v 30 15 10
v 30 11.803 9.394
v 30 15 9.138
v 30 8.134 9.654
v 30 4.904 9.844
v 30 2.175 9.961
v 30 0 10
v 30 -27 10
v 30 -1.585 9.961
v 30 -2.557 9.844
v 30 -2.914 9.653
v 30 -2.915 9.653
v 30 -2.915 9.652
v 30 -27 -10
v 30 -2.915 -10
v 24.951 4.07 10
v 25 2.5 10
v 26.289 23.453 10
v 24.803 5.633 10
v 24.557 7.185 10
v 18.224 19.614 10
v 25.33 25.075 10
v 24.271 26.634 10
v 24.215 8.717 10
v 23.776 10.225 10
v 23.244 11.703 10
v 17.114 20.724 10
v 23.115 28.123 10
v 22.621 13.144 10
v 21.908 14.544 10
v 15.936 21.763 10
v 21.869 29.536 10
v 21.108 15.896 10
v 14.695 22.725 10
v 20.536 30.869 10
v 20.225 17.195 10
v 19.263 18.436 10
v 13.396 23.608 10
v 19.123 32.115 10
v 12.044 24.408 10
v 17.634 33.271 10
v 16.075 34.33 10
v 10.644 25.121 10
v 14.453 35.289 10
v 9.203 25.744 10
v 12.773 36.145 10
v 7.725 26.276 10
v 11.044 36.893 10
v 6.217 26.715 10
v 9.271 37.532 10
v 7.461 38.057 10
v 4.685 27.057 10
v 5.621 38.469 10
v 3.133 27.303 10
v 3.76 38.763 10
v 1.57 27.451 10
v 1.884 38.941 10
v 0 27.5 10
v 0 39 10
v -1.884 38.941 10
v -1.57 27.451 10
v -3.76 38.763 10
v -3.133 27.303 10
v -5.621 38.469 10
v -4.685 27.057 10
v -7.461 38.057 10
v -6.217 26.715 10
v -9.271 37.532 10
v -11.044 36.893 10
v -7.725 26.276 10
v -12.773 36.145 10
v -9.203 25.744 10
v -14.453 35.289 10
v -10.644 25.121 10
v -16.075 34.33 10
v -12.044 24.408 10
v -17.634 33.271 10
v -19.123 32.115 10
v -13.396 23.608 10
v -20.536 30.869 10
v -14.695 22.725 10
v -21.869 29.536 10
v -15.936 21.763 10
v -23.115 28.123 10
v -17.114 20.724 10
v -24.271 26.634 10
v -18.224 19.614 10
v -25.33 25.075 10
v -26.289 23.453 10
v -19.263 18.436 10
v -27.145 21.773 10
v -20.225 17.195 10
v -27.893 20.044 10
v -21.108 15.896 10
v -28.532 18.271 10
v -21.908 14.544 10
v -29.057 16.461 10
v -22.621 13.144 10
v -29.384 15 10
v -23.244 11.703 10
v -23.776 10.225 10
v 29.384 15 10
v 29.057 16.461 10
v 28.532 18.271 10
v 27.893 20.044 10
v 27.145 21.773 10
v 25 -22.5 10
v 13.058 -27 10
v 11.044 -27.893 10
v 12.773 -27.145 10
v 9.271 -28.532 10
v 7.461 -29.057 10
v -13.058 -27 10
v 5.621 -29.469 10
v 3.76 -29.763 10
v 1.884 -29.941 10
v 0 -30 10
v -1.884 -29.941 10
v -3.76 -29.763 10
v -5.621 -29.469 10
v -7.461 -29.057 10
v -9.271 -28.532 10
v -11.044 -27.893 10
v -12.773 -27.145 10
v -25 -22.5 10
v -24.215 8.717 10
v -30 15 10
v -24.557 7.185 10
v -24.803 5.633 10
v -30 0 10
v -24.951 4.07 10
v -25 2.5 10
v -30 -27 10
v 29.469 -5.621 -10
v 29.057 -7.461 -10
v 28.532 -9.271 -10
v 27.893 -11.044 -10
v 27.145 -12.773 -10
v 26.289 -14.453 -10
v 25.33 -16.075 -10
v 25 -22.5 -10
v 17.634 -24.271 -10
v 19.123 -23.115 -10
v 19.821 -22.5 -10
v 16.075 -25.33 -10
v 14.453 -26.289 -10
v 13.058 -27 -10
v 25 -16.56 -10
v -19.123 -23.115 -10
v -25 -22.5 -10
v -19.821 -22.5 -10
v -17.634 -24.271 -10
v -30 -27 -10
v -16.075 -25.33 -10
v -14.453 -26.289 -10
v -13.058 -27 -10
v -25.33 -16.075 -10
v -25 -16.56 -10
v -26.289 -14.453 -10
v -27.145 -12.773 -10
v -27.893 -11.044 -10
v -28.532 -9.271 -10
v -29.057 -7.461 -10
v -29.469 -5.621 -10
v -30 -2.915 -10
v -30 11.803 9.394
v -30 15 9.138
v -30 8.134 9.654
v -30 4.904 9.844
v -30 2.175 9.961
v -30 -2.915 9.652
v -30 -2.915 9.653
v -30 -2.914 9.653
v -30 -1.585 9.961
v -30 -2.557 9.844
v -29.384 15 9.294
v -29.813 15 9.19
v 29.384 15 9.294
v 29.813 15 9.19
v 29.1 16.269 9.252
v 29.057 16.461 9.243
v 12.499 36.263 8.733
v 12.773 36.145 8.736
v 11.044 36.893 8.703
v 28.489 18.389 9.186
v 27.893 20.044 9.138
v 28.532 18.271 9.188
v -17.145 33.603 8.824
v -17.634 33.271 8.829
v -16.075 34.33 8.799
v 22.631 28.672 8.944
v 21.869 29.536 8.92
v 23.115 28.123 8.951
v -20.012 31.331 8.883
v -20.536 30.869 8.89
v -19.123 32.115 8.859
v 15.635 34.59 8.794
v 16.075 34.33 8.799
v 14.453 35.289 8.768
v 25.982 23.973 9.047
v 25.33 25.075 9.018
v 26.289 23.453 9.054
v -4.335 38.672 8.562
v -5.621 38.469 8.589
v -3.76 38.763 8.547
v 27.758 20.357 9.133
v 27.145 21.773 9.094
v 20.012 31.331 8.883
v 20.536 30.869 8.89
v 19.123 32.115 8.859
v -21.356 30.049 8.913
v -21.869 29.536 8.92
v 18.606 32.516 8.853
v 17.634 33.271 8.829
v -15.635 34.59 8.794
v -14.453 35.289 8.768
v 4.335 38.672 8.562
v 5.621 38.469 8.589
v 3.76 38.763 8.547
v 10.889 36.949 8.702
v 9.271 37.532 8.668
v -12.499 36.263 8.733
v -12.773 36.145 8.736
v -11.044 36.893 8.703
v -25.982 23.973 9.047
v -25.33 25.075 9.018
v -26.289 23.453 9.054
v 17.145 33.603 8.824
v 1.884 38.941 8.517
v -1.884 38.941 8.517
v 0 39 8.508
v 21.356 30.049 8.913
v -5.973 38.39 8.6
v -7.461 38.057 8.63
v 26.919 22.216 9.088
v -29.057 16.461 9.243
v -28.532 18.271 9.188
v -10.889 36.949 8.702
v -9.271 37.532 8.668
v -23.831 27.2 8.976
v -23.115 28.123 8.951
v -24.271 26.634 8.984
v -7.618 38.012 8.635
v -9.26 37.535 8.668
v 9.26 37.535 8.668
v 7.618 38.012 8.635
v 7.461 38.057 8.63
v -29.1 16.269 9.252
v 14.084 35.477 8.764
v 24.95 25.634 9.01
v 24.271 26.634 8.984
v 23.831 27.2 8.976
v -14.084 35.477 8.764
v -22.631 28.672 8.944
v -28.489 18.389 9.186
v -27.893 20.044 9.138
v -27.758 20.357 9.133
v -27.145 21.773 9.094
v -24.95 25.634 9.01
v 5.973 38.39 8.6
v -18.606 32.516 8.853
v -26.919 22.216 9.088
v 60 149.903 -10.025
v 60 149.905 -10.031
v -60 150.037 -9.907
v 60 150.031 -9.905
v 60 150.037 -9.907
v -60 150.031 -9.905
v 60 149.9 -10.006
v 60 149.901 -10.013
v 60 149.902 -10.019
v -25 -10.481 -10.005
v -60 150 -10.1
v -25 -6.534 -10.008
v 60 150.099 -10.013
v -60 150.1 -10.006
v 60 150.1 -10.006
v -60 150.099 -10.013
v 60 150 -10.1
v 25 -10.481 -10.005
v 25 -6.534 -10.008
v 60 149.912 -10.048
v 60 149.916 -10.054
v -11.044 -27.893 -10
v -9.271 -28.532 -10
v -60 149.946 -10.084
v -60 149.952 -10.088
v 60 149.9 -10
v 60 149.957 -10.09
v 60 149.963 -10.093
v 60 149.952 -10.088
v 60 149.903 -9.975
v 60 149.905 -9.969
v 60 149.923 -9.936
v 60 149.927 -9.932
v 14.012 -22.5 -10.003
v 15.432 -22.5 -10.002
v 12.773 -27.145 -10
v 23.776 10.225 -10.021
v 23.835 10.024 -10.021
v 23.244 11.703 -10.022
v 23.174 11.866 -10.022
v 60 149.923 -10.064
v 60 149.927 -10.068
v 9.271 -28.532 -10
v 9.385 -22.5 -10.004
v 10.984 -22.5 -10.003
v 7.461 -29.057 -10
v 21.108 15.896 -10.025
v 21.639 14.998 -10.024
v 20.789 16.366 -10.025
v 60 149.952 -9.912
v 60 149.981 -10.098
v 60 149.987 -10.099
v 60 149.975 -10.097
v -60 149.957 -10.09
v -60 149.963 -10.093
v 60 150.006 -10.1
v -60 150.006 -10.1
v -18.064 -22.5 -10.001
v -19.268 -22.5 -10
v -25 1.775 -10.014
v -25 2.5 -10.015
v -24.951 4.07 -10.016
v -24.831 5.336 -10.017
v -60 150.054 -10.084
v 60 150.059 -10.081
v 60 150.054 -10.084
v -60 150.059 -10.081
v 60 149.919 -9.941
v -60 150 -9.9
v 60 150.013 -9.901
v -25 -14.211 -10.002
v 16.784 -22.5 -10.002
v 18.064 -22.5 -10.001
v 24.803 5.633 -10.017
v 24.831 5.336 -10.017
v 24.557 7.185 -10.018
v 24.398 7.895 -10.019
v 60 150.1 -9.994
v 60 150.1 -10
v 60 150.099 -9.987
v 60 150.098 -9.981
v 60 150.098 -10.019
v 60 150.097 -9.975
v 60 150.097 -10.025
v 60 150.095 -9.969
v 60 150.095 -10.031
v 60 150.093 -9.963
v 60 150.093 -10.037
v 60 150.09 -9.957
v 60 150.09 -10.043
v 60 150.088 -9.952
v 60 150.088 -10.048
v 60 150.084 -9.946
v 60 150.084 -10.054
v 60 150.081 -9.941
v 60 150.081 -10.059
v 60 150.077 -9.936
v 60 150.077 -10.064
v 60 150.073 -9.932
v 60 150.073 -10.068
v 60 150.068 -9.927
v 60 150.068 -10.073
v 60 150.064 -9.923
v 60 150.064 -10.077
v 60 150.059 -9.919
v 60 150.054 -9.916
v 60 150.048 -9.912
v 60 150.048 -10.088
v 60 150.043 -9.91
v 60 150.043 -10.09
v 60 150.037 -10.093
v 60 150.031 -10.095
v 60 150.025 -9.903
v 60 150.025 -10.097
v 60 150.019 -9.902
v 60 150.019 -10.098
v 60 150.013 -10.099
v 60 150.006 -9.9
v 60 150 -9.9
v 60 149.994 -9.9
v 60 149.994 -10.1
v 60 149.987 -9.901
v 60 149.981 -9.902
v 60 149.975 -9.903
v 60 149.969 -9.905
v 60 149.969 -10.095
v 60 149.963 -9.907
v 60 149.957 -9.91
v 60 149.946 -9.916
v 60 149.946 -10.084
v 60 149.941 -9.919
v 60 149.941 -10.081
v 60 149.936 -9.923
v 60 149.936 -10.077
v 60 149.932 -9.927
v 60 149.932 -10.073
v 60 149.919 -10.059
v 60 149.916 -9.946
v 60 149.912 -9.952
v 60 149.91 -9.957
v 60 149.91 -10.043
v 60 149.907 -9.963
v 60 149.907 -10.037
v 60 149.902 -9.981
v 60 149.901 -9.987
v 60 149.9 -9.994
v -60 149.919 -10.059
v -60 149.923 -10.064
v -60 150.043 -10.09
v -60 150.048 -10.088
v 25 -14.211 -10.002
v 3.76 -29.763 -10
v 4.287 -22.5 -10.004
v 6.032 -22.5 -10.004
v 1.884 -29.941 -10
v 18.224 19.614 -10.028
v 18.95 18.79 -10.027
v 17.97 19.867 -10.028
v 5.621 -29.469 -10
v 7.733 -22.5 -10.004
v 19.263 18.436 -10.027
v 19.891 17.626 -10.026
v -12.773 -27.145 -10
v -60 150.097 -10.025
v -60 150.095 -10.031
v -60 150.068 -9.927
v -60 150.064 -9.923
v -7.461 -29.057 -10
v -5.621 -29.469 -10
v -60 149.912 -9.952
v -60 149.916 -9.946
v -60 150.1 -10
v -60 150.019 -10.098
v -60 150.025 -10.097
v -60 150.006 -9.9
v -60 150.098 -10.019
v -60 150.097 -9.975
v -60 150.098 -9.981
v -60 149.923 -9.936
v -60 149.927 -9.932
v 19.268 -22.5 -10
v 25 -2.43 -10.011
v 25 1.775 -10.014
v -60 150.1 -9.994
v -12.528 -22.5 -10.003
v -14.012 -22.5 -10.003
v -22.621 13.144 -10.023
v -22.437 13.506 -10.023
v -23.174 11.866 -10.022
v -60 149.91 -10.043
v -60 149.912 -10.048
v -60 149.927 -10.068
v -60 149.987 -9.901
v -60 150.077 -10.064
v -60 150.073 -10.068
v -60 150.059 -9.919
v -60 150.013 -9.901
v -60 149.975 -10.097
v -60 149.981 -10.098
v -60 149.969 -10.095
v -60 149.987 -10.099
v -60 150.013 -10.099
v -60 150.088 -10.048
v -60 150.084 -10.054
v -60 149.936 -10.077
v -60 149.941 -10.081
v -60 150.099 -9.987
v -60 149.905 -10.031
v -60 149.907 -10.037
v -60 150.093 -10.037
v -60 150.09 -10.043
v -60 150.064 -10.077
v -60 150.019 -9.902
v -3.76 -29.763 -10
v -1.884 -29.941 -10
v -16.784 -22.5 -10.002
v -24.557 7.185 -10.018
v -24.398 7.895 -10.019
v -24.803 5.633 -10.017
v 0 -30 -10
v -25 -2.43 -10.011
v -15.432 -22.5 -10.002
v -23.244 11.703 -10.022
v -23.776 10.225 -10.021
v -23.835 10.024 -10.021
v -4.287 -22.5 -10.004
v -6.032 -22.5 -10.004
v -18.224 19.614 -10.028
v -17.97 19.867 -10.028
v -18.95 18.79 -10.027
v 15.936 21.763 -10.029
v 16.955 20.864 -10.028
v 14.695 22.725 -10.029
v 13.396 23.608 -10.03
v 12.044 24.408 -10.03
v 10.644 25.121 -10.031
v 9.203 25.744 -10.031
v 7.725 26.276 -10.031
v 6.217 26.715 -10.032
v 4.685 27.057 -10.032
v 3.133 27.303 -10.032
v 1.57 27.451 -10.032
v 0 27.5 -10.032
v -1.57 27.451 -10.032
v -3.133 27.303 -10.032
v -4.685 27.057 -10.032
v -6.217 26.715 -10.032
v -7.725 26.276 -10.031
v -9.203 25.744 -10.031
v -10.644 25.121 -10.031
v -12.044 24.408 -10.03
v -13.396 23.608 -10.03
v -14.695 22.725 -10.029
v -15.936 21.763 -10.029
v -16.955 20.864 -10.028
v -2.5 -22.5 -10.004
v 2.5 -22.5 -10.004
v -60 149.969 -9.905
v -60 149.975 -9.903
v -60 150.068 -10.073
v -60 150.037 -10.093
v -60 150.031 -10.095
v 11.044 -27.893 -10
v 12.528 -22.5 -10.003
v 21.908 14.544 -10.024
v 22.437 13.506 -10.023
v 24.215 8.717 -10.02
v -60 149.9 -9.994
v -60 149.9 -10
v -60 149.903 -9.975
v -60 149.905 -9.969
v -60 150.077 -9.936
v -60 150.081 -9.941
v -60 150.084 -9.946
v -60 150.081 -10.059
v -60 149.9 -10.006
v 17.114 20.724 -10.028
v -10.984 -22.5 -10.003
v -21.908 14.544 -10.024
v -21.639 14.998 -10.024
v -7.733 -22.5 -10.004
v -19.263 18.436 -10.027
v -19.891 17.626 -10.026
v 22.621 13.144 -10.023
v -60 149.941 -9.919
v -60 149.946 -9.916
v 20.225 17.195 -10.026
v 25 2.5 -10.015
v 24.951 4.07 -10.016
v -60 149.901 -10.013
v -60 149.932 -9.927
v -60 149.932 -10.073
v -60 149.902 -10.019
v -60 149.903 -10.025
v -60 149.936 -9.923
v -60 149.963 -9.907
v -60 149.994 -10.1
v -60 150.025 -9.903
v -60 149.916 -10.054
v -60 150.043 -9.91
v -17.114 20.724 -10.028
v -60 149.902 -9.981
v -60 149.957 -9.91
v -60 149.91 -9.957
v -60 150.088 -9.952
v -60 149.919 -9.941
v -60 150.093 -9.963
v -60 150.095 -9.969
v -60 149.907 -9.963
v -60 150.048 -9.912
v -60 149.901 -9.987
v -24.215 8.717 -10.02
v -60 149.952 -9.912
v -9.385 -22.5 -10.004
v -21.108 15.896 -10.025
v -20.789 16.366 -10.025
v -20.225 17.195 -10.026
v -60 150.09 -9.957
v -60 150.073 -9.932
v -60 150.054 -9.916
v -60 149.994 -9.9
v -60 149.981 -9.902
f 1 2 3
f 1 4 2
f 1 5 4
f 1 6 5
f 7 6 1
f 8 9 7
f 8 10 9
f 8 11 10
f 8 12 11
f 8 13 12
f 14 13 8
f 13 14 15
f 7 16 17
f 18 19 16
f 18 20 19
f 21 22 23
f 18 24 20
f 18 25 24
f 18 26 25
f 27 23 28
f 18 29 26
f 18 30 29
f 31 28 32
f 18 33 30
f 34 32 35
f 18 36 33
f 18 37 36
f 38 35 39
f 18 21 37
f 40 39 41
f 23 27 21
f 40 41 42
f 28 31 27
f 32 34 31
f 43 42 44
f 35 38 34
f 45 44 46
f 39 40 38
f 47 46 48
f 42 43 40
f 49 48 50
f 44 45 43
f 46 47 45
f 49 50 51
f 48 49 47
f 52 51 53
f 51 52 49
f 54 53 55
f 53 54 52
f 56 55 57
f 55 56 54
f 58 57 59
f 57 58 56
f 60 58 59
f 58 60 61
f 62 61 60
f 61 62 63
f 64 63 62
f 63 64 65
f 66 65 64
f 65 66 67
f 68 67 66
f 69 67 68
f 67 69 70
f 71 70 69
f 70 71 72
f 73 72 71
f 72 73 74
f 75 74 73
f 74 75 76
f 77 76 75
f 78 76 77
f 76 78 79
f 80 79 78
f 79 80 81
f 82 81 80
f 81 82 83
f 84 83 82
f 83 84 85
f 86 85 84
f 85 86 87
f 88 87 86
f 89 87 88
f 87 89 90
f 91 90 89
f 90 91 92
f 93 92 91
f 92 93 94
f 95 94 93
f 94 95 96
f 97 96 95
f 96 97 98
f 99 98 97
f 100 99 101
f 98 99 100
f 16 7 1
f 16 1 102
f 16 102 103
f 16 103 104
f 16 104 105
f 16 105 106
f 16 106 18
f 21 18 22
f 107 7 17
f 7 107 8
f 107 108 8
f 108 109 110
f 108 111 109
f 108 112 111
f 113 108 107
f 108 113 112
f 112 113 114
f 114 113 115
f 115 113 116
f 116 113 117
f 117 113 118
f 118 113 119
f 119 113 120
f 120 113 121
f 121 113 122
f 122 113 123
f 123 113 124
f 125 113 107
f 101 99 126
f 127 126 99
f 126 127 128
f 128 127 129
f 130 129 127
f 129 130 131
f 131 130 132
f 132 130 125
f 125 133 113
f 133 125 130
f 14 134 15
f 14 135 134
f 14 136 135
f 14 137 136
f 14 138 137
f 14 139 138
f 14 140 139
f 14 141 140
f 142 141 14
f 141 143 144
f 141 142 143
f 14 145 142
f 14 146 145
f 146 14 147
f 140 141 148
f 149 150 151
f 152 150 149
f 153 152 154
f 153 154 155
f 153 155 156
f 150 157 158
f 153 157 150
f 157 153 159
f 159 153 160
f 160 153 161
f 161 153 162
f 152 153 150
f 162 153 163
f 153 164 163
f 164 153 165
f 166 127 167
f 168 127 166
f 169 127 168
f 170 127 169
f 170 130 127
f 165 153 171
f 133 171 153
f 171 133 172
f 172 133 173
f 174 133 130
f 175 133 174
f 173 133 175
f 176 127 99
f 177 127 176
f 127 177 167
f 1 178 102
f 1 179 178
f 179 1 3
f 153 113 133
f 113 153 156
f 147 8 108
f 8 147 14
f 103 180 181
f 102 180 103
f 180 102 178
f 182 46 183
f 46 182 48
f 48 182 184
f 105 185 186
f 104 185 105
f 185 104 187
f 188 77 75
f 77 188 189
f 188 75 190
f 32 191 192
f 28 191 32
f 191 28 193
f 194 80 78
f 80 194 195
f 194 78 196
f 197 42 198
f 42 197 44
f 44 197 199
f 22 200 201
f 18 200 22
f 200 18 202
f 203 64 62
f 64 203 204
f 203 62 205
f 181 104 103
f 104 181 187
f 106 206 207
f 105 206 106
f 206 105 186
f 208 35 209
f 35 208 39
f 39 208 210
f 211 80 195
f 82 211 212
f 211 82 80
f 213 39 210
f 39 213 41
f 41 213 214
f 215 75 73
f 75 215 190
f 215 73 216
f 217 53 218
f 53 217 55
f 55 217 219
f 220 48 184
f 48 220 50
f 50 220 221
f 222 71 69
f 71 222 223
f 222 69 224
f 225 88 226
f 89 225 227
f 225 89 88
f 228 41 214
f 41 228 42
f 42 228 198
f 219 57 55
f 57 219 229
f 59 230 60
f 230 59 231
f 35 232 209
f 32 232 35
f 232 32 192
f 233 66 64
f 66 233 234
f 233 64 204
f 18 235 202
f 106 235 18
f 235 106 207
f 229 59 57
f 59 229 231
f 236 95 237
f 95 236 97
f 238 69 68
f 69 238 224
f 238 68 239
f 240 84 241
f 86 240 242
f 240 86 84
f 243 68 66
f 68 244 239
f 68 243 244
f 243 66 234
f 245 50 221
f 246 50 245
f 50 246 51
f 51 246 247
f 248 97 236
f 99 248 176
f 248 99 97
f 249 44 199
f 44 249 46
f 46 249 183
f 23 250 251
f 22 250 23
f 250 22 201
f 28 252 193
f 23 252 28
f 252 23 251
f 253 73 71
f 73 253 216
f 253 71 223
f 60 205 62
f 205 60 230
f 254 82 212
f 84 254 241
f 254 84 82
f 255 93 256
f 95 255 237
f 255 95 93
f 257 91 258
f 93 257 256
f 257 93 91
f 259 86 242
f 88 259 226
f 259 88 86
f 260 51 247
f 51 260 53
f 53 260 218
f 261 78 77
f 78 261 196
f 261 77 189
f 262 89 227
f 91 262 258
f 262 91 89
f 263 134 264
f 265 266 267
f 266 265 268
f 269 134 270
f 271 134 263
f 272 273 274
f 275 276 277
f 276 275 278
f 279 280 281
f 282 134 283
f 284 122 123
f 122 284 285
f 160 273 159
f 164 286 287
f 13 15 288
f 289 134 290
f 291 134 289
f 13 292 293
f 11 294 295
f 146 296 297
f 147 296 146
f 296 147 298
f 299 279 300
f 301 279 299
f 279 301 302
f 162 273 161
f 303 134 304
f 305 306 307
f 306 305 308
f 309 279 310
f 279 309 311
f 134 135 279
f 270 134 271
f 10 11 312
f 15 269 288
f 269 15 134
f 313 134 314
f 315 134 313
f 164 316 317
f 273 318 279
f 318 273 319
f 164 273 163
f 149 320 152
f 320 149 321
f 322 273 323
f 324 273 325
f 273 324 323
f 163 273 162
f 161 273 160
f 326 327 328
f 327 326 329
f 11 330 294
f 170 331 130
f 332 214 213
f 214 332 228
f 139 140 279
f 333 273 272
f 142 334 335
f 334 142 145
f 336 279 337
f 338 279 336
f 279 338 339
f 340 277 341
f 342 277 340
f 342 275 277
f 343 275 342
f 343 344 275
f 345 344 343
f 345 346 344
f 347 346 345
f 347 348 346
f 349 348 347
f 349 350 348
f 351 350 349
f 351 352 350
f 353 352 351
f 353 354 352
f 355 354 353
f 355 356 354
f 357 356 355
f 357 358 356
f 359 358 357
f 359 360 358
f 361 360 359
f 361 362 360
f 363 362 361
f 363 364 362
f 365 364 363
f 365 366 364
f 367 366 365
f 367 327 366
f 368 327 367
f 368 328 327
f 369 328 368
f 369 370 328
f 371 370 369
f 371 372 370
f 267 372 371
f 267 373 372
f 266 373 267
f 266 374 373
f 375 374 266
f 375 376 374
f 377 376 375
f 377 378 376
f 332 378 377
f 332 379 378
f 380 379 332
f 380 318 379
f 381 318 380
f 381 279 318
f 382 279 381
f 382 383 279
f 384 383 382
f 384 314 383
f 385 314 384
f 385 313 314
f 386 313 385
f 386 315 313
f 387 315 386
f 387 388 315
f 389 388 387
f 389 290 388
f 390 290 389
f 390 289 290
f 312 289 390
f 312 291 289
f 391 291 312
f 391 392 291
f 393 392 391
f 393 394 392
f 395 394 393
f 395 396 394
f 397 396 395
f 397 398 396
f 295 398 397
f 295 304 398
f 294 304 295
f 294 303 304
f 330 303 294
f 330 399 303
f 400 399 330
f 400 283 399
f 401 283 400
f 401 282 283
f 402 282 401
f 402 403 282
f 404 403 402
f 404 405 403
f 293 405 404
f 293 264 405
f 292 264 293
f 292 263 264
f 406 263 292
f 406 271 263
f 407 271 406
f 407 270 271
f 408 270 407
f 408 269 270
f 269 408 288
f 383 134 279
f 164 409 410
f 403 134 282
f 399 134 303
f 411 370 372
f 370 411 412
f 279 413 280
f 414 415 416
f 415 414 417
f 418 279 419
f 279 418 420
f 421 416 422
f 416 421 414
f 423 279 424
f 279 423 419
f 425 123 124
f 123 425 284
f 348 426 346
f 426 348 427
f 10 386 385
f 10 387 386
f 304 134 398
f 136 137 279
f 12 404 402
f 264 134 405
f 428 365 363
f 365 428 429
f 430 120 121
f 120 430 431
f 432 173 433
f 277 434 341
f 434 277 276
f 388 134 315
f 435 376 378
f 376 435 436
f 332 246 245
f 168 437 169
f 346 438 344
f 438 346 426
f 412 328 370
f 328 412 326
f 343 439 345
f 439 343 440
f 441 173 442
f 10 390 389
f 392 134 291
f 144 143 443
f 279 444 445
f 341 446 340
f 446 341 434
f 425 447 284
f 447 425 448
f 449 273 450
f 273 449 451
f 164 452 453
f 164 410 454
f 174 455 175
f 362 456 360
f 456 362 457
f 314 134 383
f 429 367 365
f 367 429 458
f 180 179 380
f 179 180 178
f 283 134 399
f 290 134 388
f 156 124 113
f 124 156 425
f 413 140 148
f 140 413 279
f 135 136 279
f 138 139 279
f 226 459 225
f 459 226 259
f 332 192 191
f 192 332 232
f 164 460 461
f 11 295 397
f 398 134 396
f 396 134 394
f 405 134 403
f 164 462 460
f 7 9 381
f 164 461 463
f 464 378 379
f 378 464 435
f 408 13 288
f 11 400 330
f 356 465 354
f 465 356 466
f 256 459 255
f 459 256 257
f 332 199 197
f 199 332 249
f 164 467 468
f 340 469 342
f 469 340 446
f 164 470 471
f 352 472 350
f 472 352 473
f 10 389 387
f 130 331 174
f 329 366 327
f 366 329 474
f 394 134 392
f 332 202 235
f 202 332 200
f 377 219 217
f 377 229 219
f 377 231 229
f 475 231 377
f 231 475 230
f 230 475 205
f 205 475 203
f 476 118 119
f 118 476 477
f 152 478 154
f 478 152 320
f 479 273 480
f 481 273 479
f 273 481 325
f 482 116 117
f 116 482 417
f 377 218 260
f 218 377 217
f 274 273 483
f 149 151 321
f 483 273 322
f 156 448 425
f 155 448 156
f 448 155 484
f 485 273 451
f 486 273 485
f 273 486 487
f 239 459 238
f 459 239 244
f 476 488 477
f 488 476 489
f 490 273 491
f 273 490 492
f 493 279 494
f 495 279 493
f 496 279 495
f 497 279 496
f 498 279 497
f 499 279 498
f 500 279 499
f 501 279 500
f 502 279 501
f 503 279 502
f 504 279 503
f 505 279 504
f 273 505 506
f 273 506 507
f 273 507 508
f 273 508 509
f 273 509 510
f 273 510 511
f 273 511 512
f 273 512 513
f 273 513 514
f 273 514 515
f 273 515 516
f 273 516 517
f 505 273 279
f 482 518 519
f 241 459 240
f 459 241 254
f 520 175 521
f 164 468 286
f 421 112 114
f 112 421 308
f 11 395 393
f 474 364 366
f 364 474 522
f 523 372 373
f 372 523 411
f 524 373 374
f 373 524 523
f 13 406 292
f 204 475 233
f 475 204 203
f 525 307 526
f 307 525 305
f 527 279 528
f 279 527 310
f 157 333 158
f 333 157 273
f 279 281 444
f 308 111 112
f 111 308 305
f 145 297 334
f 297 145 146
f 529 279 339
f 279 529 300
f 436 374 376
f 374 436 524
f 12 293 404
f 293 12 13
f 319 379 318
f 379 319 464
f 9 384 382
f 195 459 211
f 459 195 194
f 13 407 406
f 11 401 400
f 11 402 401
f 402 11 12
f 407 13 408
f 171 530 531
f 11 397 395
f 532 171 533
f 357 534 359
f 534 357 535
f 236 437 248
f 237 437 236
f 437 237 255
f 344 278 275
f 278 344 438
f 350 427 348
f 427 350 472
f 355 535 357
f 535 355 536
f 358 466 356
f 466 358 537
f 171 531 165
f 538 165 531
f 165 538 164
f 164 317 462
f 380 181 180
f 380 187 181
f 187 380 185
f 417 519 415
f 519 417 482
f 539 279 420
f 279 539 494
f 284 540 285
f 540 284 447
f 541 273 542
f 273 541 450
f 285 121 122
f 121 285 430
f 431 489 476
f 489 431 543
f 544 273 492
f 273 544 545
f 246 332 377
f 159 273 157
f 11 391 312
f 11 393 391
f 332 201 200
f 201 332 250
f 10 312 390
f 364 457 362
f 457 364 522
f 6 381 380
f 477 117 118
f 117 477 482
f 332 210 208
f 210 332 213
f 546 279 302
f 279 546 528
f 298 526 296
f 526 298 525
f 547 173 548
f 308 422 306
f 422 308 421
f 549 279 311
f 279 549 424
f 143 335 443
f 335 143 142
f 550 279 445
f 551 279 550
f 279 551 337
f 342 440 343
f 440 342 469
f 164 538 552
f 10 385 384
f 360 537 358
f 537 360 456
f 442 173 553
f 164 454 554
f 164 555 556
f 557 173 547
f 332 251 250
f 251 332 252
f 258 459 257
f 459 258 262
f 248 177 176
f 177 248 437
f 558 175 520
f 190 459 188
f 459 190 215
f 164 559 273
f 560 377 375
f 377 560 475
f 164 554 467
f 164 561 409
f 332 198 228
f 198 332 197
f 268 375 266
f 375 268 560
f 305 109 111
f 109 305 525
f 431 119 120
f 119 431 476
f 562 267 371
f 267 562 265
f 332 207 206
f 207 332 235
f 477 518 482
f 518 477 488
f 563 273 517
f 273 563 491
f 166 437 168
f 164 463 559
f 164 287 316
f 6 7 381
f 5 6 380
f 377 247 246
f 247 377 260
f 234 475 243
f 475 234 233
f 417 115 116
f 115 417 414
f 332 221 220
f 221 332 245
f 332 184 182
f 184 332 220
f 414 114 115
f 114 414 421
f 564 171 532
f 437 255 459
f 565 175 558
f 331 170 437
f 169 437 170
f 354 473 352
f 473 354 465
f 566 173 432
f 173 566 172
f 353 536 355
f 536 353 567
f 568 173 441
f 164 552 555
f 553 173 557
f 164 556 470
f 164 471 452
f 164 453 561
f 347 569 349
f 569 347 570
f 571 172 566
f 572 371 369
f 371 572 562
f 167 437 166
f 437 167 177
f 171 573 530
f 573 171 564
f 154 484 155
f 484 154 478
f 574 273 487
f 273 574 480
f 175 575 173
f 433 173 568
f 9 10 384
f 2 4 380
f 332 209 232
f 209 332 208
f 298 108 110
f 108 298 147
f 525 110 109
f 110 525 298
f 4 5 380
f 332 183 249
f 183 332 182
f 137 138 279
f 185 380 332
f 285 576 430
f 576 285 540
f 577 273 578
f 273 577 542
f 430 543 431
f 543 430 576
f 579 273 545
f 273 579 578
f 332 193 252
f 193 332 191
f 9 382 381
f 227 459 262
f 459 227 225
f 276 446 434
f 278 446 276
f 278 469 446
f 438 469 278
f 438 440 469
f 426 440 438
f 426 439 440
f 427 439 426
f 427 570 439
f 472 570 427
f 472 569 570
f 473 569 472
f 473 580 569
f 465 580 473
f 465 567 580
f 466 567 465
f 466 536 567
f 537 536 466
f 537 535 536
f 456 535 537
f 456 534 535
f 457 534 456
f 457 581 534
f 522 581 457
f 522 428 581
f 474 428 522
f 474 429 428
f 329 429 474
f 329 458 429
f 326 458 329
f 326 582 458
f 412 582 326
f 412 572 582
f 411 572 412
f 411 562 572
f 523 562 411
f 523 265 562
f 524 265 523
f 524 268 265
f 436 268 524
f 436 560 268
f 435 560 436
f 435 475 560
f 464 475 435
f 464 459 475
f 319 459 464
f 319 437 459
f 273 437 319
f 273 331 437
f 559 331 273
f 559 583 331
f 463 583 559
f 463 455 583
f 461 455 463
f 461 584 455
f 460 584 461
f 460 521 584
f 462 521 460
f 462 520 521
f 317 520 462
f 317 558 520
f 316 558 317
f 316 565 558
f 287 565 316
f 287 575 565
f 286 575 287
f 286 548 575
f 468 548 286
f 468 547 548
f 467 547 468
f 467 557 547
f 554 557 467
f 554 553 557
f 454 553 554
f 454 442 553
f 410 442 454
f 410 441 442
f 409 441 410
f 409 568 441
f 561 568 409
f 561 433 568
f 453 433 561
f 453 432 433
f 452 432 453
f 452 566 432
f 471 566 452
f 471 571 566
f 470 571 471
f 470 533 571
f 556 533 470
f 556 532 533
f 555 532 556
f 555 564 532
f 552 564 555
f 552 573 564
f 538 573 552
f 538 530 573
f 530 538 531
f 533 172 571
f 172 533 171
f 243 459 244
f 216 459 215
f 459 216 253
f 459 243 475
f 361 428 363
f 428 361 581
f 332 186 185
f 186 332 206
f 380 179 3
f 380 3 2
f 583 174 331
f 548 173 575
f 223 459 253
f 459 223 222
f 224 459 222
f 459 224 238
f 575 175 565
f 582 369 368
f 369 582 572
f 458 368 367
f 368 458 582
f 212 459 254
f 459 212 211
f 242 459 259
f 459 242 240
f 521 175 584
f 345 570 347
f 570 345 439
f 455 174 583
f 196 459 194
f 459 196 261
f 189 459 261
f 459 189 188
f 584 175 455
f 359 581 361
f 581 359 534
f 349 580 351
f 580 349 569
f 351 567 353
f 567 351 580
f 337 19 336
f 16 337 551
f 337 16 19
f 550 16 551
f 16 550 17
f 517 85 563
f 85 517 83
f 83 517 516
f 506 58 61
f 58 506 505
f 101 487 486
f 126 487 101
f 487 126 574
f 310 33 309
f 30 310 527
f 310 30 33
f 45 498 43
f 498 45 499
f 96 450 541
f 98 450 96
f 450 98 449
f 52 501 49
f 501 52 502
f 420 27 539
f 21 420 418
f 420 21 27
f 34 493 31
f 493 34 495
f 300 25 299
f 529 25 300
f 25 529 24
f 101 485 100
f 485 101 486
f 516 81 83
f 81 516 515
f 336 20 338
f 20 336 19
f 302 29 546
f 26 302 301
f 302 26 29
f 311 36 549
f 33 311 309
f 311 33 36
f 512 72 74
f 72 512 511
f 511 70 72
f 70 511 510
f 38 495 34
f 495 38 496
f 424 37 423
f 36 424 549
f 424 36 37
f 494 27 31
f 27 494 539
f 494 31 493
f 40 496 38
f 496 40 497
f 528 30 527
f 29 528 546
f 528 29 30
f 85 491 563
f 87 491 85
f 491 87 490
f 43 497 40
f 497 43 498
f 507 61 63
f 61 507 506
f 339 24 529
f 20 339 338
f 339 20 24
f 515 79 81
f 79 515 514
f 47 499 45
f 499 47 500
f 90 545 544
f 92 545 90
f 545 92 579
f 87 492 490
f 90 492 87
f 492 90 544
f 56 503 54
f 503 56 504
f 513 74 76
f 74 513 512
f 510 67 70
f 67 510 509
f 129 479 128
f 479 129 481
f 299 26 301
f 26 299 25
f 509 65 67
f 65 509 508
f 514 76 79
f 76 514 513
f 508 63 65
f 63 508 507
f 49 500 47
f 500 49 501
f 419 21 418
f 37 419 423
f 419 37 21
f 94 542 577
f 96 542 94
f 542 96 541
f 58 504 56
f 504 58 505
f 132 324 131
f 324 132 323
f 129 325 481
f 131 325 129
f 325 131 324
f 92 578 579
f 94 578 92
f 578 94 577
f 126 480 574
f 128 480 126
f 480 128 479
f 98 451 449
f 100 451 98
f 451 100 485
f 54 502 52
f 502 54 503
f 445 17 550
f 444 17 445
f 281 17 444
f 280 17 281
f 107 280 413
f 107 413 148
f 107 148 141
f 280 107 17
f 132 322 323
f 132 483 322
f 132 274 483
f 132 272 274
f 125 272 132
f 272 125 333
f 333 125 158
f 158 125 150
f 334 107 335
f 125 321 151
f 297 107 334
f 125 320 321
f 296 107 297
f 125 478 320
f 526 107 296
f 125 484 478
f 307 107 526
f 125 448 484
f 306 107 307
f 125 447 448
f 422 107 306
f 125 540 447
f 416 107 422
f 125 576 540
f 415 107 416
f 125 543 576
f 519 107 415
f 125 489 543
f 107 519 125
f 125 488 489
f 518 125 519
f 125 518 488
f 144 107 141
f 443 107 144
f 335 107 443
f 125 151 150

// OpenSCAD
// Customizable simple hoe head

//Customizer Variables

//axe head back
r= 60; //[1:200]

//resolution
n=100; //[1:200]

//hoe head height
h=20; //[1:500]

// handle hole radius
x=25; // 

//scale LENGTH OF HOE
s=150; //

// base blade thickness
b=30;//

// blade width
w=120;

l=50;

module chuck(){
	union(){
translate([0,-0.1*r,0])cube([r,0.7*r,h], center = true);
translate([0,0.3*r/2,0])cylinder(h = h, r1 = r/2, r2 = r/2, center = true, $fn=n);
}
}

module chunk(){
chuck();
hull(){
cylinder(h = h, r1 = b, r2 = b, center = true, $fn=n);
translate([0,s,-h/2])rotate([0,90,0])cylinder(h = w, r1 = 0.1, r2 = 0.1, center = true, $fn=n);
				}
}

module hoe(){
	difference(){
	chunk();	
	translate([0,x*.1,0])cylinder(h = h+l+1, r1 = x, r2 = x, center = true, $fn=n); //HANDLE HOL
	translate([-x,-x*.9,-h/2-1])cube([2*x, x,h+l+1,]); //SQUARE HANDLE HOLE
	}
					}
hoe();
